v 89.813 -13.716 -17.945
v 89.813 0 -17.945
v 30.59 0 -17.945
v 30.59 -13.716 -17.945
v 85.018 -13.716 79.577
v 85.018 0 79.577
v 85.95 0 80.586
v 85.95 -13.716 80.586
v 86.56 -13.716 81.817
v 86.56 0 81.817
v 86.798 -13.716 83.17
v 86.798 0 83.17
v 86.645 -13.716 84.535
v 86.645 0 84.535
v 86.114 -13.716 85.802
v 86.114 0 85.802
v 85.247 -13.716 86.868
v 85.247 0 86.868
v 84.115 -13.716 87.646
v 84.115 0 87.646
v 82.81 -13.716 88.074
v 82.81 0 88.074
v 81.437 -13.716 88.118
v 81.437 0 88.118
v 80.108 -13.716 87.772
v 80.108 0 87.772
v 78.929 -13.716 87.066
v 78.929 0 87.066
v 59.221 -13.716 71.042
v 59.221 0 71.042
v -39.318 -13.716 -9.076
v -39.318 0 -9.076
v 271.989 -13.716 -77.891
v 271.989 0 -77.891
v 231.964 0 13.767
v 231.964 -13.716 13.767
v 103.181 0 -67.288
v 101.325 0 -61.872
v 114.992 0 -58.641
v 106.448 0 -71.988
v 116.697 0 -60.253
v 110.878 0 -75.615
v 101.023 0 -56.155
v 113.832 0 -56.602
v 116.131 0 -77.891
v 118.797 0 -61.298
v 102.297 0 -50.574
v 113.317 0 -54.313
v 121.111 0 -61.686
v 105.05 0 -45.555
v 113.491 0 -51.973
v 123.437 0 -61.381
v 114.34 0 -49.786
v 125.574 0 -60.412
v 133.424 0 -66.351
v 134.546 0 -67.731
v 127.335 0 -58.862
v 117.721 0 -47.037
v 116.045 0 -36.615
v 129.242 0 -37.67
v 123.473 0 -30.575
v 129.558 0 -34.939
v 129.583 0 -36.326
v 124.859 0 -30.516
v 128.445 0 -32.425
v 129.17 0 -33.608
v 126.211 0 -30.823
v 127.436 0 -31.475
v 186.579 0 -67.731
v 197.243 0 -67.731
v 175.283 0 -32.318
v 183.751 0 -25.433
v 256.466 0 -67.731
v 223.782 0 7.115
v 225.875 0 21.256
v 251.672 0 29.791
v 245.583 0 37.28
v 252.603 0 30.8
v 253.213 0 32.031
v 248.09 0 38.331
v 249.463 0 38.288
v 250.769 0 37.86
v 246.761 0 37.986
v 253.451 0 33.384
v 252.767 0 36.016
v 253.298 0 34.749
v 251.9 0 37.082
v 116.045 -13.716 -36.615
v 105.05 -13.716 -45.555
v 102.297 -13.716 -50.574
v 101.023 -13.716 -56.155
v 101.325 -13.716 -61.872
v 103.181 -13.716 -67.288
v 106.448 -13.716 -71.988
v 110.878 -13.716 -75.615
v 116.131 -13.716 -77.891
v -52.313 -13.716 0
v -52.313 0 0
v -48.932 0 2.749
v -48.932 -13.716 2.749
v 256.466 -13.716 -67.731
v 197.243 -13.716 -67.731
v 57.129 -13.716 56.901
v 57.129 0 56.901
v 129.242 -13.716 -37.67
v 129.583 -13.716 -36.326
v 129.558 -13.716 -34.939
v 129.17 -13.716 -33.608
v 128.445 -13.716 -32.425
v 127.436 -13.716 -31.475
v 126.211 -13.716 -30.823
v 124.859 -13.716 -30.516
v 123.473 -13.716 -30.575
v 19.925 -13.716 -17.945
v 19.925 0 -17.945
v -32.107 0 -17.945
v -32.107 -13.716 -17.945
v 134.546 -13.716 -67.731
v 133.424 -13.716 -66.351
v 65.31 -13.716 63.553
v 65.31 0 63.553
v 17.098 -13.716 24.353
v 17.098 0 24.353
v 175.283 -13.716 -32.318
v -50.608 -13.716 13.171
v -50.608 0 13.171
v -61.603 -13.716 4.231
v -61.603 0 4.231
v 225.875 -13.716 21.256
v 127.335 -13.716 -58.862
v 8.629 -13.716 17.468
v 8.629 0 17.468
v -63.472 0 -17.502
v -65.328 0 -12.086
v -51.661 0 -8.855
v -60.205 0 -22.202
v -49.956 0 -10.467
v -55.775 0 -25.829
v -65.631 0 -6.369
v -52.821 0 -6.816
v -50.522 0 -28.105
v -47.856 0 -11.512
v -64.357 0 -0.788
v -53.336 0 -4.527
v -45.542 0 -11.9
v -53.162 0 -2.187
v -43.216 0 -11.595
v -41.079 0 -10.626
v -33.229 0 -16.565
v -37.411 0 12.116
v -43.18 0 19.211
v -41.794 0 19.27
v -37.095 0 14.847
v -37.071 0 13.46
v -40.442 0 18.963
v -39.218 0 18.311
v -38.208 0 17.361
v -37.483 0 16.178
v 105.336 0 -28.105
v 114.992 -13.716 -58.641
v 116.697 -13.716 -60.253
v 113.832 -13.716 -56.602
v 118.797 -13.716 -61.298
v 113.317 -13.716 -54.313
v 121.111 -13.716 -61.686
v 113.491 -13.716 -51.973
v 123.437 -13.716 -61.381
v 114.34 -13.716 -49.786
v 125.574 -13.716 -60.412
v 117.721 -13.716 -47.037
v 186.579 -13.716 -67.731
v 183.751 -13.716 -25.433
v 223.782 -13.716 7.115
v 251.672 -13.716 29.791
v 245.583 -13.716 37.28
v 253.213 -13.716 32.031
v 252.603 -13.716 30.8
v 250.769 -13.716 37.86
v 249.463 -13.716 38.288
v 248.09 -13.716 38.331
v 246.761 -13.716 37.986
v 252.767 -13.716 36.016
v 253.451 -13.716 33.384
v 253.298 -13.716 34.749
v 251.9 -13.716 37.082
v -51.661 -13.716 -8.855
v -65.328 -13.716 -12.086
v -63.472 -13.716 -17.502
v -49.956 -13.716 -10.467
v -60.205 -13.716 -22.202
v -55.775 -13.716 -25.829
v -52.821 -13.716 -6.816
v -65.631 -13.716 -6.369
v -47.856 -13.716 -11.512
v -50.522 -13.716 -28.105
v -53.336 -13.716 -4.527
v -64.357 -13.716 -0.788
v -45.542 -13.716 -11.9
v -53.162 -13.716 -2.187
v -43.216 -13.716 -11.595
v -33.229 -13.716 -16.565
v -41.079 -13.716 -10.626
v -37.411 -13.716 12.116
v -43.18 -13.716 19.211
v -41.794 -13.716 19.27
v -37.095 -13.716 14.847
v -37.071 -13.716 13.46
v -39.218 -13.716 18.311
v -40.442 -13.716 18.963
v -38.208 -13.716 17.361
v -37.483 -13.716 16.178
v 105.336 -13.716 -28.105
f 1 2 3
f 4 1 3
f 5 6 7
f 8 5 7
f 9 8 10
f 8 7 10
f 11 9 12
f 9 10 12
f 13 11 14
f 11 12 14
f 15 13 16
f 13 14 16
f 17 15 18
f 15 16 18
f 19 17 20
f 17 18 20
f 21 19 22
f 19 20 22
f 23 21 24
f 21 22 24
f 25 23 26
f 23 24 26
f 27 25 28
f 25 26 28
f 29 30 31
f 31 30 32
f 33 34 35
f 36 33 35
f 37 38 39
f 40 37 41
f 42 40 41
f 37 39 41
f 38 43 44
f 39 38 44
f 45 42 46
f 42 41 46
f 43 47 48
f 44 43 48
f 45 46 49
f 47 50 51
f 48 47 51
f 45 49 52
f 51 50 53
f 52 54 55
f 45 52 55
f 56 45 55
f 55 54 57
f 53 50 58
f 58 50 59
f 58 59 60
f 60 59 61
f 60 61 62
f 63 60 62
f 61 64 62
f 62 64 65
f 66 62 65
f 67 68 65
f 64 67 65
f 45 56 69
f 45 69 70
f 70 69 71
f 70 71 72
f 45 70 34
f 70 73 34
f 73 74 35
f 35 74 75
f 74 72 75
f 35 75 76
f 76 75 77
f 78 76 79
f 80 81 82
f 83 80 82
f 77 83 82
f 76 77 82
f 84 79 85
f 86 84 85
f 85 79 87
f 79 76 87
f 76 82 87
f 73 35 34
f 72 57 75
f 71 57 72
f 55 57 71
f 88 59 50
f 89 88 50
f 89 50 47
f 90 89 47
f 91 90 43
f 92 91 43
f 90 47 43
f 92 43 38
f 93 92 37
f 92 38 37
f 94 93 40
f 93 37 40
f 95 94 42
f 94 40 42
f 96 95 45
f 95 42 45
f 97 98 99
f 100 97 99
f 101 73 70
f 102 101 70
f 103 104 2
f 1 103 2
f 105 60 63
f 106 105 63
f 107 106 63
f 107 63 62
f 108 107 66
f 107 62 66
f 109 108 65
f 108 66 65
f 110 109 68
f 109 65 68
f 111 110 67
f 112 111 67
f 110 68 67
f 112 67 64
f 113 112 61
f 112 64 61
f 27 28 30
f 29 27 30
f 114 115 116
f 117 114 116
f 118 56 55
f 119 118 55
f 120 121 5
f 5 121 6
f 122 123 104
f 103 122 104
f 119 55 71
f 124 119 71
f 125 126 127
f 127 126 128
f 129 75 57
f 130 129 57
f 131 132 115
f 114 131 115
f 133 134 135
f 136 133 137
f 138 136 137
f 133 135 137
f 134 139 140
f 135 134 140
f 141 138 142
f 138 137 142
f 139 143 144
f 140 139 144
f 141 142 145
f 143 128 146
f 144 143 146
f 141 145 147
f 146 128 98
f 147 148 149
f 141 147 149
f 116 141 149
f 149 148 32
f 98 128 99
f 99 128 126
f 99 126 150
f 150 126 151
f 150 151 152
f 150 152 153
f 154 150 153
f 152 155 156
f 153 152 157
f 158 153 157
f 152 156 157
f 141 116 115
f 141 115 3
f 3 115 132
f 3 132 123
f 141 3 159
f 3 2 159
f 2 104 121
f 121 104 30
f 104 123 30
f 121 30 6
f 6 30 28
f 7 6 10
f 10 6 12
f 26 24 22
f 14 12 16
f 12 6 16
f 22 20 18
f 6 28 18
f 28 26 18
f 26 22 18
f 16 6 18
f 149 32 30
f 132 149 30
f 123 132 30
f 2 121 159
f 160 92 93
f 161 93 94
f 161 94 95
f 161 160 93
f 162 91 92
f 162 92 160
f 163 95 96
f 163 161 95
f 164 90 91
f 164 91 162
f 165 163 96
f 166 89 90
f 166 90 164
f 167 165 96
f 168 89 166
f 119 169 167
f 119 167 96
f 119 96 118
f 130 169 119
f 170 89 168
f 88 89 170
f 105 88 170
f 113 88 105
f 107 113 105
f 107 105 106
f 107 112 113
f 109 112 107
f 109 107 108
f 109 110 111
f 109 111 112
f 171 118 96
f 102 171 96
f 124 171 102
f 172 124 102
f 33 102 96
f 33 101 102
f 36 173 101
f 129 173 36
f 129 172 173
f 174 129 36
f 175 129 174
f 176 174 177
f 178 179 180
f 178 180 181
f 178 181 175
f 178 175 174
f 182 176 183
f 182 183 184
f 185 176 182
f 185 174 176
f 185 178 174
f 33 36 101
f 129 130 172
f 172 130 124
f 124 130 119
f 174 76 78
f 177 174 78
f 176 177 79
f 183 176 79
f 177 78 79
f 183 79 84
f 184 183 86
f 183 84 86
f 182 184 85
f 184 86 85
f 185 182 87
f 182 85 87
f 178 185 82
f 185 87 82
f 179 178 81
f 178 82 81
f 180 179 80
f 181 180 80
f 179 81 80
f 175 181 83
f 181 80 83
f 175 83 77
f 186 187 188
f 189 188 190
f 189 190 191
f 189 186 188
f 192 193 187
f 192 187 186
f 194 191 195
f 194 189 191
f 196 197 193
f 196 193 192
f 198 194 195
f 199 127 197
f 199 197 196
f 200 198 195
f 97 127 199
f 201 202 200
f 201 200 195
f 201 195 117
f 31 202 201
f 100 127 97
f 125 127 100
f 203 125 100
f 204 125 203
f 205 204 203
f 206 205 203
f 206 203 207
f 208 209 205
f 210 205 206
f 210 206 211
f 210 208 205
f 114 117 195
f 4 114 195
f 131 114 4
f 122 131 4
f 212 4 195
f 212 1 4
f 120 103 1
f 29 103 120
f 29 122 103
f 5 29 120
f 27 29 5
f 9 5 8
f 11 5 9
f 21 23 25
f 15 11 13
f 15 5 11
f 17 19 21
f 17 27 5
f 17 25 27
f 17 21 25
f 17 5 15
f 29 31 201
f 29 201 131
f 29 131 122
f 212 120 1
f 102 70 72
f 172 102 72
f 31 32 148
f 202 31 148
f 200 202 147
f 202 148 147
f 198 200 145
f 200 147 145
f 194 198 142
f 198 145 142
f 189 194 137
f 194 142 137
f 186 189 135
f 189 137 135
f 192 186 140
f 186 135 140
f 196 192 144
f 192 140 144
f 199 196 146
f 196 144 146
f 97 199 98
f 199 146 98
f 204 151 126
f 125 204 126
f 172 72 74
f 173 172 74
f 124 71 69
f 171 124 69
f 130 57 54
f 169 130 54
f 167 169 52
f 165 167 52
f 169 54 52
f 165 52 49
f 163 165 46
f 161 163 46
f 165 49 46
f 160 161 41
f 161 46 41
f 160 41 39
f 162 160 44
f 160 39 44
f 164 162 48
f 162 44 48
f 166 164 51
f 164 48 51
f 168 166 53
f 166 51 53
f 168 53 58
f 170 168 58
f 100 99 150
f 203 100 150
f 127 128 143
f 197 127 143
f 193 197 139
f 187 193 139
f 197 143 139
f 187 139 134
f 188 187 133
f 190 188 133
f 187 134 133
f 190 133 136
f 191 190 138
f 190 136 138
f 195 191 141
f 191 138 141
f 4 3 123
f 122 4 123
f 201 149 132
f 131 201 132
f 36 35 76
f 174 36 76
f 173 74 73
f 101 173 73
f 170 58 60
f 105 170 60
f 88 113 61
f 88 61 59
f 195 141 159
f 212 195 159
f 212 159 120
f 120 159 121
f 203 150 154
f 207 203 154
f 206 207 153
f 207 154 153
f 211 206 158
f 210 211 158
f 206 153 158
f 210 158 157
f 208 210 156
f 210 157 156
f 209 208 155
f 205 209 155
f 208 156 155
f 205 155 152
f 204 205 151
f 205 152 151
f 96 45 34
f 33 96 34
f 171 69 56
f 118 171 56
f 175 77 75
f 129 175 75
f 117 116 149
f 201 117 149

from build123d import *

# Parameters (mm, degrees)
F1_DEPTH = 13.716
F2_DEPTH = 13.716
F3_DEPTH = 13.716
F4_DEPTH = 13.716


with BuildPart() as f1:
    # F0 (on Front) → F1 (new body)
    with BuildSketch(Plane.XZ):
        with BuildLine():
            Line((-33.229091, -16.565101), (-39.318088, -9.076095))
            ThreePointArc((-39.318088, -9.076095), (-49.956463, -10.466923), (-52.312929, 0))
            Line((-52.312929, 0), (-48.932294, 2.748652))
            Line((-48.932294, 2.748652), (-37.411277, 12.115909))
            ThreePointArc((-37.411277, 12.115909), (-38.207902, 17.360703), (-43.179801, 19.210757))
            Line((-43.179801, 19.210757), (-50.6085, 13.170793))
            Line((-50.6085, 13.170793), (-61.603338, 4.23135))
            ThreePointArc((-61.603338, 4.23135), (-64.588219, -14.858184), (-50.522273, -28.104655))
            Line((-50.522273, -28.104655), (-44.243115, -28.104655))
            Line((-44.243115, -28.104655), (105.335705, -28.104655))
            Line((105.335705, -28.104655), (65.310465, 63.553286))
            Line((65.310465, 63.553286), (57.128855, 56.901161))
            Line((57.128855, 56.901161), (89.812567, -17.944655))
            Line((89.812567, -17.944655), (30.589637, -17.944655))
            Line((30.589637, -17.944655), (19.925294, -17.944655))
            Line((19.925294, -17.944655), (-32.107433, -17.944655))
            Line((-32.107433, -17.944655), (-33.229091, -16.565101))
        make_face()
    extrude(amount=F1_DEPTH)

    # F0 (on Front) → F2 (join)
    with BuildSketch(Plane.XZ):
        Polygon((59.221468, 71.042292), (-39.318088, -9.076095), (-33.229091, -16.565101), (8.629475, 17.468346), (17.097647, 24.353462), (57.128855, 56.901161), (65.310465, 63.553286), align=None)
        with BuildLine():
            Line((78.929379, 87.06597), (59.221468, 71.042292))
            Line((59.221468, 71.042292), (65.310465, 63.553286))
            Line((65.310465, 63.553286), (85.018376, 79.576963))
            ThreePointArc((85.018376, 79.576963), (85.718381, 86.365965), (78.929379, 87.06597))
        make_face()
    extrude(amount=F2_DEPTH)

    # F0 (on Front) → F3 (join)
    with BuildSketch(Plane.XZ):
        Polygon((17.097647, 24.353462), (8.629475, 17.468346), (19.925294, -17.944655), (30.589637, -17.944655), align=None)
    extrude(amount=F3_DEPTH)


with BuildPart() as f4:
    # F0 (on Front) → F4 (new body)
    with BuildSketch(Plane.XZ):
        with BuildLine():
            Line((133.424161, -66.351195), (127.335164, -58.862188))
            ThreePointArc((127.335164, -58.862188), (116.696789, -60.253017), (114.340323, -49.786094))
            Line((114.340323, -49.786094), (117.720957, -47.037442))
            Line((117.720957, -47.037442), (129.241975, -37.670185))
            ThreePointArc((129.241975, -37.670185), (128.44535, -32.425391), (123.473451, -30.575337))
            Line((123.473451, -30.575337), (116.044752, -36.615301))
            Line((116.044752, -36.615301), (105.049913, -45.554744))
            ThreePointArc((105.049913, -45.554744), (102.065033, -64.644278), (116.130979, -77.890748))
            Line((116.130979, -77.890748), (122.410137, -77.890748))
            Line((122.410137, -77.890748), (271.988957, -77.890748))
            Line((271.988957, -77.890748), (231.963717, 13.767192))
            Line((231.963717, 13.767192), (223.782107, 7.115067))
            Line((223.782107, 7.115067), (256.465819, -67.730748))
            Line((256.465819, -67.730748), (197.242889, -67.730748))
            Line((197.242889, -67.730748), (186.578546, -67.730748))
            Line((186.578546, -67.730748), (134.545819, -67.730748))
            Line((134.545819, -67.730748), (133.424161, -66.351195))
        make_face()
        Polygon((225.87472, 21.256198), (127.335164, -58.862188), (133.424161, -66.351195), (175.282727, -32.317748), (183.750898, -25.432632), (223.782107, 7.115067), (231.963717, 13.767192), align=None)
        Polygon((183.750898, -25.432632), (175.282727, -32.317748), (186.578546, -67.730748), (197.242889, -67.730748), align=None)
        with BuildLine():
            Line((245.582631, 37.279876), (225.87472, 21.256198))
            Line((225.87472, 21.256198), (231.963717, 13.767192))
            Line((231.963717, 13.767192), (251.671628, 29.79087))
            ThreePointArc((251.671628, 29.79087), (252.371633, 36.579871), (245.582631, 37.279876))
        make_face()
    extrude(amount=F4_DEPTH)


solid = Compound([f1.part, f4.part])
